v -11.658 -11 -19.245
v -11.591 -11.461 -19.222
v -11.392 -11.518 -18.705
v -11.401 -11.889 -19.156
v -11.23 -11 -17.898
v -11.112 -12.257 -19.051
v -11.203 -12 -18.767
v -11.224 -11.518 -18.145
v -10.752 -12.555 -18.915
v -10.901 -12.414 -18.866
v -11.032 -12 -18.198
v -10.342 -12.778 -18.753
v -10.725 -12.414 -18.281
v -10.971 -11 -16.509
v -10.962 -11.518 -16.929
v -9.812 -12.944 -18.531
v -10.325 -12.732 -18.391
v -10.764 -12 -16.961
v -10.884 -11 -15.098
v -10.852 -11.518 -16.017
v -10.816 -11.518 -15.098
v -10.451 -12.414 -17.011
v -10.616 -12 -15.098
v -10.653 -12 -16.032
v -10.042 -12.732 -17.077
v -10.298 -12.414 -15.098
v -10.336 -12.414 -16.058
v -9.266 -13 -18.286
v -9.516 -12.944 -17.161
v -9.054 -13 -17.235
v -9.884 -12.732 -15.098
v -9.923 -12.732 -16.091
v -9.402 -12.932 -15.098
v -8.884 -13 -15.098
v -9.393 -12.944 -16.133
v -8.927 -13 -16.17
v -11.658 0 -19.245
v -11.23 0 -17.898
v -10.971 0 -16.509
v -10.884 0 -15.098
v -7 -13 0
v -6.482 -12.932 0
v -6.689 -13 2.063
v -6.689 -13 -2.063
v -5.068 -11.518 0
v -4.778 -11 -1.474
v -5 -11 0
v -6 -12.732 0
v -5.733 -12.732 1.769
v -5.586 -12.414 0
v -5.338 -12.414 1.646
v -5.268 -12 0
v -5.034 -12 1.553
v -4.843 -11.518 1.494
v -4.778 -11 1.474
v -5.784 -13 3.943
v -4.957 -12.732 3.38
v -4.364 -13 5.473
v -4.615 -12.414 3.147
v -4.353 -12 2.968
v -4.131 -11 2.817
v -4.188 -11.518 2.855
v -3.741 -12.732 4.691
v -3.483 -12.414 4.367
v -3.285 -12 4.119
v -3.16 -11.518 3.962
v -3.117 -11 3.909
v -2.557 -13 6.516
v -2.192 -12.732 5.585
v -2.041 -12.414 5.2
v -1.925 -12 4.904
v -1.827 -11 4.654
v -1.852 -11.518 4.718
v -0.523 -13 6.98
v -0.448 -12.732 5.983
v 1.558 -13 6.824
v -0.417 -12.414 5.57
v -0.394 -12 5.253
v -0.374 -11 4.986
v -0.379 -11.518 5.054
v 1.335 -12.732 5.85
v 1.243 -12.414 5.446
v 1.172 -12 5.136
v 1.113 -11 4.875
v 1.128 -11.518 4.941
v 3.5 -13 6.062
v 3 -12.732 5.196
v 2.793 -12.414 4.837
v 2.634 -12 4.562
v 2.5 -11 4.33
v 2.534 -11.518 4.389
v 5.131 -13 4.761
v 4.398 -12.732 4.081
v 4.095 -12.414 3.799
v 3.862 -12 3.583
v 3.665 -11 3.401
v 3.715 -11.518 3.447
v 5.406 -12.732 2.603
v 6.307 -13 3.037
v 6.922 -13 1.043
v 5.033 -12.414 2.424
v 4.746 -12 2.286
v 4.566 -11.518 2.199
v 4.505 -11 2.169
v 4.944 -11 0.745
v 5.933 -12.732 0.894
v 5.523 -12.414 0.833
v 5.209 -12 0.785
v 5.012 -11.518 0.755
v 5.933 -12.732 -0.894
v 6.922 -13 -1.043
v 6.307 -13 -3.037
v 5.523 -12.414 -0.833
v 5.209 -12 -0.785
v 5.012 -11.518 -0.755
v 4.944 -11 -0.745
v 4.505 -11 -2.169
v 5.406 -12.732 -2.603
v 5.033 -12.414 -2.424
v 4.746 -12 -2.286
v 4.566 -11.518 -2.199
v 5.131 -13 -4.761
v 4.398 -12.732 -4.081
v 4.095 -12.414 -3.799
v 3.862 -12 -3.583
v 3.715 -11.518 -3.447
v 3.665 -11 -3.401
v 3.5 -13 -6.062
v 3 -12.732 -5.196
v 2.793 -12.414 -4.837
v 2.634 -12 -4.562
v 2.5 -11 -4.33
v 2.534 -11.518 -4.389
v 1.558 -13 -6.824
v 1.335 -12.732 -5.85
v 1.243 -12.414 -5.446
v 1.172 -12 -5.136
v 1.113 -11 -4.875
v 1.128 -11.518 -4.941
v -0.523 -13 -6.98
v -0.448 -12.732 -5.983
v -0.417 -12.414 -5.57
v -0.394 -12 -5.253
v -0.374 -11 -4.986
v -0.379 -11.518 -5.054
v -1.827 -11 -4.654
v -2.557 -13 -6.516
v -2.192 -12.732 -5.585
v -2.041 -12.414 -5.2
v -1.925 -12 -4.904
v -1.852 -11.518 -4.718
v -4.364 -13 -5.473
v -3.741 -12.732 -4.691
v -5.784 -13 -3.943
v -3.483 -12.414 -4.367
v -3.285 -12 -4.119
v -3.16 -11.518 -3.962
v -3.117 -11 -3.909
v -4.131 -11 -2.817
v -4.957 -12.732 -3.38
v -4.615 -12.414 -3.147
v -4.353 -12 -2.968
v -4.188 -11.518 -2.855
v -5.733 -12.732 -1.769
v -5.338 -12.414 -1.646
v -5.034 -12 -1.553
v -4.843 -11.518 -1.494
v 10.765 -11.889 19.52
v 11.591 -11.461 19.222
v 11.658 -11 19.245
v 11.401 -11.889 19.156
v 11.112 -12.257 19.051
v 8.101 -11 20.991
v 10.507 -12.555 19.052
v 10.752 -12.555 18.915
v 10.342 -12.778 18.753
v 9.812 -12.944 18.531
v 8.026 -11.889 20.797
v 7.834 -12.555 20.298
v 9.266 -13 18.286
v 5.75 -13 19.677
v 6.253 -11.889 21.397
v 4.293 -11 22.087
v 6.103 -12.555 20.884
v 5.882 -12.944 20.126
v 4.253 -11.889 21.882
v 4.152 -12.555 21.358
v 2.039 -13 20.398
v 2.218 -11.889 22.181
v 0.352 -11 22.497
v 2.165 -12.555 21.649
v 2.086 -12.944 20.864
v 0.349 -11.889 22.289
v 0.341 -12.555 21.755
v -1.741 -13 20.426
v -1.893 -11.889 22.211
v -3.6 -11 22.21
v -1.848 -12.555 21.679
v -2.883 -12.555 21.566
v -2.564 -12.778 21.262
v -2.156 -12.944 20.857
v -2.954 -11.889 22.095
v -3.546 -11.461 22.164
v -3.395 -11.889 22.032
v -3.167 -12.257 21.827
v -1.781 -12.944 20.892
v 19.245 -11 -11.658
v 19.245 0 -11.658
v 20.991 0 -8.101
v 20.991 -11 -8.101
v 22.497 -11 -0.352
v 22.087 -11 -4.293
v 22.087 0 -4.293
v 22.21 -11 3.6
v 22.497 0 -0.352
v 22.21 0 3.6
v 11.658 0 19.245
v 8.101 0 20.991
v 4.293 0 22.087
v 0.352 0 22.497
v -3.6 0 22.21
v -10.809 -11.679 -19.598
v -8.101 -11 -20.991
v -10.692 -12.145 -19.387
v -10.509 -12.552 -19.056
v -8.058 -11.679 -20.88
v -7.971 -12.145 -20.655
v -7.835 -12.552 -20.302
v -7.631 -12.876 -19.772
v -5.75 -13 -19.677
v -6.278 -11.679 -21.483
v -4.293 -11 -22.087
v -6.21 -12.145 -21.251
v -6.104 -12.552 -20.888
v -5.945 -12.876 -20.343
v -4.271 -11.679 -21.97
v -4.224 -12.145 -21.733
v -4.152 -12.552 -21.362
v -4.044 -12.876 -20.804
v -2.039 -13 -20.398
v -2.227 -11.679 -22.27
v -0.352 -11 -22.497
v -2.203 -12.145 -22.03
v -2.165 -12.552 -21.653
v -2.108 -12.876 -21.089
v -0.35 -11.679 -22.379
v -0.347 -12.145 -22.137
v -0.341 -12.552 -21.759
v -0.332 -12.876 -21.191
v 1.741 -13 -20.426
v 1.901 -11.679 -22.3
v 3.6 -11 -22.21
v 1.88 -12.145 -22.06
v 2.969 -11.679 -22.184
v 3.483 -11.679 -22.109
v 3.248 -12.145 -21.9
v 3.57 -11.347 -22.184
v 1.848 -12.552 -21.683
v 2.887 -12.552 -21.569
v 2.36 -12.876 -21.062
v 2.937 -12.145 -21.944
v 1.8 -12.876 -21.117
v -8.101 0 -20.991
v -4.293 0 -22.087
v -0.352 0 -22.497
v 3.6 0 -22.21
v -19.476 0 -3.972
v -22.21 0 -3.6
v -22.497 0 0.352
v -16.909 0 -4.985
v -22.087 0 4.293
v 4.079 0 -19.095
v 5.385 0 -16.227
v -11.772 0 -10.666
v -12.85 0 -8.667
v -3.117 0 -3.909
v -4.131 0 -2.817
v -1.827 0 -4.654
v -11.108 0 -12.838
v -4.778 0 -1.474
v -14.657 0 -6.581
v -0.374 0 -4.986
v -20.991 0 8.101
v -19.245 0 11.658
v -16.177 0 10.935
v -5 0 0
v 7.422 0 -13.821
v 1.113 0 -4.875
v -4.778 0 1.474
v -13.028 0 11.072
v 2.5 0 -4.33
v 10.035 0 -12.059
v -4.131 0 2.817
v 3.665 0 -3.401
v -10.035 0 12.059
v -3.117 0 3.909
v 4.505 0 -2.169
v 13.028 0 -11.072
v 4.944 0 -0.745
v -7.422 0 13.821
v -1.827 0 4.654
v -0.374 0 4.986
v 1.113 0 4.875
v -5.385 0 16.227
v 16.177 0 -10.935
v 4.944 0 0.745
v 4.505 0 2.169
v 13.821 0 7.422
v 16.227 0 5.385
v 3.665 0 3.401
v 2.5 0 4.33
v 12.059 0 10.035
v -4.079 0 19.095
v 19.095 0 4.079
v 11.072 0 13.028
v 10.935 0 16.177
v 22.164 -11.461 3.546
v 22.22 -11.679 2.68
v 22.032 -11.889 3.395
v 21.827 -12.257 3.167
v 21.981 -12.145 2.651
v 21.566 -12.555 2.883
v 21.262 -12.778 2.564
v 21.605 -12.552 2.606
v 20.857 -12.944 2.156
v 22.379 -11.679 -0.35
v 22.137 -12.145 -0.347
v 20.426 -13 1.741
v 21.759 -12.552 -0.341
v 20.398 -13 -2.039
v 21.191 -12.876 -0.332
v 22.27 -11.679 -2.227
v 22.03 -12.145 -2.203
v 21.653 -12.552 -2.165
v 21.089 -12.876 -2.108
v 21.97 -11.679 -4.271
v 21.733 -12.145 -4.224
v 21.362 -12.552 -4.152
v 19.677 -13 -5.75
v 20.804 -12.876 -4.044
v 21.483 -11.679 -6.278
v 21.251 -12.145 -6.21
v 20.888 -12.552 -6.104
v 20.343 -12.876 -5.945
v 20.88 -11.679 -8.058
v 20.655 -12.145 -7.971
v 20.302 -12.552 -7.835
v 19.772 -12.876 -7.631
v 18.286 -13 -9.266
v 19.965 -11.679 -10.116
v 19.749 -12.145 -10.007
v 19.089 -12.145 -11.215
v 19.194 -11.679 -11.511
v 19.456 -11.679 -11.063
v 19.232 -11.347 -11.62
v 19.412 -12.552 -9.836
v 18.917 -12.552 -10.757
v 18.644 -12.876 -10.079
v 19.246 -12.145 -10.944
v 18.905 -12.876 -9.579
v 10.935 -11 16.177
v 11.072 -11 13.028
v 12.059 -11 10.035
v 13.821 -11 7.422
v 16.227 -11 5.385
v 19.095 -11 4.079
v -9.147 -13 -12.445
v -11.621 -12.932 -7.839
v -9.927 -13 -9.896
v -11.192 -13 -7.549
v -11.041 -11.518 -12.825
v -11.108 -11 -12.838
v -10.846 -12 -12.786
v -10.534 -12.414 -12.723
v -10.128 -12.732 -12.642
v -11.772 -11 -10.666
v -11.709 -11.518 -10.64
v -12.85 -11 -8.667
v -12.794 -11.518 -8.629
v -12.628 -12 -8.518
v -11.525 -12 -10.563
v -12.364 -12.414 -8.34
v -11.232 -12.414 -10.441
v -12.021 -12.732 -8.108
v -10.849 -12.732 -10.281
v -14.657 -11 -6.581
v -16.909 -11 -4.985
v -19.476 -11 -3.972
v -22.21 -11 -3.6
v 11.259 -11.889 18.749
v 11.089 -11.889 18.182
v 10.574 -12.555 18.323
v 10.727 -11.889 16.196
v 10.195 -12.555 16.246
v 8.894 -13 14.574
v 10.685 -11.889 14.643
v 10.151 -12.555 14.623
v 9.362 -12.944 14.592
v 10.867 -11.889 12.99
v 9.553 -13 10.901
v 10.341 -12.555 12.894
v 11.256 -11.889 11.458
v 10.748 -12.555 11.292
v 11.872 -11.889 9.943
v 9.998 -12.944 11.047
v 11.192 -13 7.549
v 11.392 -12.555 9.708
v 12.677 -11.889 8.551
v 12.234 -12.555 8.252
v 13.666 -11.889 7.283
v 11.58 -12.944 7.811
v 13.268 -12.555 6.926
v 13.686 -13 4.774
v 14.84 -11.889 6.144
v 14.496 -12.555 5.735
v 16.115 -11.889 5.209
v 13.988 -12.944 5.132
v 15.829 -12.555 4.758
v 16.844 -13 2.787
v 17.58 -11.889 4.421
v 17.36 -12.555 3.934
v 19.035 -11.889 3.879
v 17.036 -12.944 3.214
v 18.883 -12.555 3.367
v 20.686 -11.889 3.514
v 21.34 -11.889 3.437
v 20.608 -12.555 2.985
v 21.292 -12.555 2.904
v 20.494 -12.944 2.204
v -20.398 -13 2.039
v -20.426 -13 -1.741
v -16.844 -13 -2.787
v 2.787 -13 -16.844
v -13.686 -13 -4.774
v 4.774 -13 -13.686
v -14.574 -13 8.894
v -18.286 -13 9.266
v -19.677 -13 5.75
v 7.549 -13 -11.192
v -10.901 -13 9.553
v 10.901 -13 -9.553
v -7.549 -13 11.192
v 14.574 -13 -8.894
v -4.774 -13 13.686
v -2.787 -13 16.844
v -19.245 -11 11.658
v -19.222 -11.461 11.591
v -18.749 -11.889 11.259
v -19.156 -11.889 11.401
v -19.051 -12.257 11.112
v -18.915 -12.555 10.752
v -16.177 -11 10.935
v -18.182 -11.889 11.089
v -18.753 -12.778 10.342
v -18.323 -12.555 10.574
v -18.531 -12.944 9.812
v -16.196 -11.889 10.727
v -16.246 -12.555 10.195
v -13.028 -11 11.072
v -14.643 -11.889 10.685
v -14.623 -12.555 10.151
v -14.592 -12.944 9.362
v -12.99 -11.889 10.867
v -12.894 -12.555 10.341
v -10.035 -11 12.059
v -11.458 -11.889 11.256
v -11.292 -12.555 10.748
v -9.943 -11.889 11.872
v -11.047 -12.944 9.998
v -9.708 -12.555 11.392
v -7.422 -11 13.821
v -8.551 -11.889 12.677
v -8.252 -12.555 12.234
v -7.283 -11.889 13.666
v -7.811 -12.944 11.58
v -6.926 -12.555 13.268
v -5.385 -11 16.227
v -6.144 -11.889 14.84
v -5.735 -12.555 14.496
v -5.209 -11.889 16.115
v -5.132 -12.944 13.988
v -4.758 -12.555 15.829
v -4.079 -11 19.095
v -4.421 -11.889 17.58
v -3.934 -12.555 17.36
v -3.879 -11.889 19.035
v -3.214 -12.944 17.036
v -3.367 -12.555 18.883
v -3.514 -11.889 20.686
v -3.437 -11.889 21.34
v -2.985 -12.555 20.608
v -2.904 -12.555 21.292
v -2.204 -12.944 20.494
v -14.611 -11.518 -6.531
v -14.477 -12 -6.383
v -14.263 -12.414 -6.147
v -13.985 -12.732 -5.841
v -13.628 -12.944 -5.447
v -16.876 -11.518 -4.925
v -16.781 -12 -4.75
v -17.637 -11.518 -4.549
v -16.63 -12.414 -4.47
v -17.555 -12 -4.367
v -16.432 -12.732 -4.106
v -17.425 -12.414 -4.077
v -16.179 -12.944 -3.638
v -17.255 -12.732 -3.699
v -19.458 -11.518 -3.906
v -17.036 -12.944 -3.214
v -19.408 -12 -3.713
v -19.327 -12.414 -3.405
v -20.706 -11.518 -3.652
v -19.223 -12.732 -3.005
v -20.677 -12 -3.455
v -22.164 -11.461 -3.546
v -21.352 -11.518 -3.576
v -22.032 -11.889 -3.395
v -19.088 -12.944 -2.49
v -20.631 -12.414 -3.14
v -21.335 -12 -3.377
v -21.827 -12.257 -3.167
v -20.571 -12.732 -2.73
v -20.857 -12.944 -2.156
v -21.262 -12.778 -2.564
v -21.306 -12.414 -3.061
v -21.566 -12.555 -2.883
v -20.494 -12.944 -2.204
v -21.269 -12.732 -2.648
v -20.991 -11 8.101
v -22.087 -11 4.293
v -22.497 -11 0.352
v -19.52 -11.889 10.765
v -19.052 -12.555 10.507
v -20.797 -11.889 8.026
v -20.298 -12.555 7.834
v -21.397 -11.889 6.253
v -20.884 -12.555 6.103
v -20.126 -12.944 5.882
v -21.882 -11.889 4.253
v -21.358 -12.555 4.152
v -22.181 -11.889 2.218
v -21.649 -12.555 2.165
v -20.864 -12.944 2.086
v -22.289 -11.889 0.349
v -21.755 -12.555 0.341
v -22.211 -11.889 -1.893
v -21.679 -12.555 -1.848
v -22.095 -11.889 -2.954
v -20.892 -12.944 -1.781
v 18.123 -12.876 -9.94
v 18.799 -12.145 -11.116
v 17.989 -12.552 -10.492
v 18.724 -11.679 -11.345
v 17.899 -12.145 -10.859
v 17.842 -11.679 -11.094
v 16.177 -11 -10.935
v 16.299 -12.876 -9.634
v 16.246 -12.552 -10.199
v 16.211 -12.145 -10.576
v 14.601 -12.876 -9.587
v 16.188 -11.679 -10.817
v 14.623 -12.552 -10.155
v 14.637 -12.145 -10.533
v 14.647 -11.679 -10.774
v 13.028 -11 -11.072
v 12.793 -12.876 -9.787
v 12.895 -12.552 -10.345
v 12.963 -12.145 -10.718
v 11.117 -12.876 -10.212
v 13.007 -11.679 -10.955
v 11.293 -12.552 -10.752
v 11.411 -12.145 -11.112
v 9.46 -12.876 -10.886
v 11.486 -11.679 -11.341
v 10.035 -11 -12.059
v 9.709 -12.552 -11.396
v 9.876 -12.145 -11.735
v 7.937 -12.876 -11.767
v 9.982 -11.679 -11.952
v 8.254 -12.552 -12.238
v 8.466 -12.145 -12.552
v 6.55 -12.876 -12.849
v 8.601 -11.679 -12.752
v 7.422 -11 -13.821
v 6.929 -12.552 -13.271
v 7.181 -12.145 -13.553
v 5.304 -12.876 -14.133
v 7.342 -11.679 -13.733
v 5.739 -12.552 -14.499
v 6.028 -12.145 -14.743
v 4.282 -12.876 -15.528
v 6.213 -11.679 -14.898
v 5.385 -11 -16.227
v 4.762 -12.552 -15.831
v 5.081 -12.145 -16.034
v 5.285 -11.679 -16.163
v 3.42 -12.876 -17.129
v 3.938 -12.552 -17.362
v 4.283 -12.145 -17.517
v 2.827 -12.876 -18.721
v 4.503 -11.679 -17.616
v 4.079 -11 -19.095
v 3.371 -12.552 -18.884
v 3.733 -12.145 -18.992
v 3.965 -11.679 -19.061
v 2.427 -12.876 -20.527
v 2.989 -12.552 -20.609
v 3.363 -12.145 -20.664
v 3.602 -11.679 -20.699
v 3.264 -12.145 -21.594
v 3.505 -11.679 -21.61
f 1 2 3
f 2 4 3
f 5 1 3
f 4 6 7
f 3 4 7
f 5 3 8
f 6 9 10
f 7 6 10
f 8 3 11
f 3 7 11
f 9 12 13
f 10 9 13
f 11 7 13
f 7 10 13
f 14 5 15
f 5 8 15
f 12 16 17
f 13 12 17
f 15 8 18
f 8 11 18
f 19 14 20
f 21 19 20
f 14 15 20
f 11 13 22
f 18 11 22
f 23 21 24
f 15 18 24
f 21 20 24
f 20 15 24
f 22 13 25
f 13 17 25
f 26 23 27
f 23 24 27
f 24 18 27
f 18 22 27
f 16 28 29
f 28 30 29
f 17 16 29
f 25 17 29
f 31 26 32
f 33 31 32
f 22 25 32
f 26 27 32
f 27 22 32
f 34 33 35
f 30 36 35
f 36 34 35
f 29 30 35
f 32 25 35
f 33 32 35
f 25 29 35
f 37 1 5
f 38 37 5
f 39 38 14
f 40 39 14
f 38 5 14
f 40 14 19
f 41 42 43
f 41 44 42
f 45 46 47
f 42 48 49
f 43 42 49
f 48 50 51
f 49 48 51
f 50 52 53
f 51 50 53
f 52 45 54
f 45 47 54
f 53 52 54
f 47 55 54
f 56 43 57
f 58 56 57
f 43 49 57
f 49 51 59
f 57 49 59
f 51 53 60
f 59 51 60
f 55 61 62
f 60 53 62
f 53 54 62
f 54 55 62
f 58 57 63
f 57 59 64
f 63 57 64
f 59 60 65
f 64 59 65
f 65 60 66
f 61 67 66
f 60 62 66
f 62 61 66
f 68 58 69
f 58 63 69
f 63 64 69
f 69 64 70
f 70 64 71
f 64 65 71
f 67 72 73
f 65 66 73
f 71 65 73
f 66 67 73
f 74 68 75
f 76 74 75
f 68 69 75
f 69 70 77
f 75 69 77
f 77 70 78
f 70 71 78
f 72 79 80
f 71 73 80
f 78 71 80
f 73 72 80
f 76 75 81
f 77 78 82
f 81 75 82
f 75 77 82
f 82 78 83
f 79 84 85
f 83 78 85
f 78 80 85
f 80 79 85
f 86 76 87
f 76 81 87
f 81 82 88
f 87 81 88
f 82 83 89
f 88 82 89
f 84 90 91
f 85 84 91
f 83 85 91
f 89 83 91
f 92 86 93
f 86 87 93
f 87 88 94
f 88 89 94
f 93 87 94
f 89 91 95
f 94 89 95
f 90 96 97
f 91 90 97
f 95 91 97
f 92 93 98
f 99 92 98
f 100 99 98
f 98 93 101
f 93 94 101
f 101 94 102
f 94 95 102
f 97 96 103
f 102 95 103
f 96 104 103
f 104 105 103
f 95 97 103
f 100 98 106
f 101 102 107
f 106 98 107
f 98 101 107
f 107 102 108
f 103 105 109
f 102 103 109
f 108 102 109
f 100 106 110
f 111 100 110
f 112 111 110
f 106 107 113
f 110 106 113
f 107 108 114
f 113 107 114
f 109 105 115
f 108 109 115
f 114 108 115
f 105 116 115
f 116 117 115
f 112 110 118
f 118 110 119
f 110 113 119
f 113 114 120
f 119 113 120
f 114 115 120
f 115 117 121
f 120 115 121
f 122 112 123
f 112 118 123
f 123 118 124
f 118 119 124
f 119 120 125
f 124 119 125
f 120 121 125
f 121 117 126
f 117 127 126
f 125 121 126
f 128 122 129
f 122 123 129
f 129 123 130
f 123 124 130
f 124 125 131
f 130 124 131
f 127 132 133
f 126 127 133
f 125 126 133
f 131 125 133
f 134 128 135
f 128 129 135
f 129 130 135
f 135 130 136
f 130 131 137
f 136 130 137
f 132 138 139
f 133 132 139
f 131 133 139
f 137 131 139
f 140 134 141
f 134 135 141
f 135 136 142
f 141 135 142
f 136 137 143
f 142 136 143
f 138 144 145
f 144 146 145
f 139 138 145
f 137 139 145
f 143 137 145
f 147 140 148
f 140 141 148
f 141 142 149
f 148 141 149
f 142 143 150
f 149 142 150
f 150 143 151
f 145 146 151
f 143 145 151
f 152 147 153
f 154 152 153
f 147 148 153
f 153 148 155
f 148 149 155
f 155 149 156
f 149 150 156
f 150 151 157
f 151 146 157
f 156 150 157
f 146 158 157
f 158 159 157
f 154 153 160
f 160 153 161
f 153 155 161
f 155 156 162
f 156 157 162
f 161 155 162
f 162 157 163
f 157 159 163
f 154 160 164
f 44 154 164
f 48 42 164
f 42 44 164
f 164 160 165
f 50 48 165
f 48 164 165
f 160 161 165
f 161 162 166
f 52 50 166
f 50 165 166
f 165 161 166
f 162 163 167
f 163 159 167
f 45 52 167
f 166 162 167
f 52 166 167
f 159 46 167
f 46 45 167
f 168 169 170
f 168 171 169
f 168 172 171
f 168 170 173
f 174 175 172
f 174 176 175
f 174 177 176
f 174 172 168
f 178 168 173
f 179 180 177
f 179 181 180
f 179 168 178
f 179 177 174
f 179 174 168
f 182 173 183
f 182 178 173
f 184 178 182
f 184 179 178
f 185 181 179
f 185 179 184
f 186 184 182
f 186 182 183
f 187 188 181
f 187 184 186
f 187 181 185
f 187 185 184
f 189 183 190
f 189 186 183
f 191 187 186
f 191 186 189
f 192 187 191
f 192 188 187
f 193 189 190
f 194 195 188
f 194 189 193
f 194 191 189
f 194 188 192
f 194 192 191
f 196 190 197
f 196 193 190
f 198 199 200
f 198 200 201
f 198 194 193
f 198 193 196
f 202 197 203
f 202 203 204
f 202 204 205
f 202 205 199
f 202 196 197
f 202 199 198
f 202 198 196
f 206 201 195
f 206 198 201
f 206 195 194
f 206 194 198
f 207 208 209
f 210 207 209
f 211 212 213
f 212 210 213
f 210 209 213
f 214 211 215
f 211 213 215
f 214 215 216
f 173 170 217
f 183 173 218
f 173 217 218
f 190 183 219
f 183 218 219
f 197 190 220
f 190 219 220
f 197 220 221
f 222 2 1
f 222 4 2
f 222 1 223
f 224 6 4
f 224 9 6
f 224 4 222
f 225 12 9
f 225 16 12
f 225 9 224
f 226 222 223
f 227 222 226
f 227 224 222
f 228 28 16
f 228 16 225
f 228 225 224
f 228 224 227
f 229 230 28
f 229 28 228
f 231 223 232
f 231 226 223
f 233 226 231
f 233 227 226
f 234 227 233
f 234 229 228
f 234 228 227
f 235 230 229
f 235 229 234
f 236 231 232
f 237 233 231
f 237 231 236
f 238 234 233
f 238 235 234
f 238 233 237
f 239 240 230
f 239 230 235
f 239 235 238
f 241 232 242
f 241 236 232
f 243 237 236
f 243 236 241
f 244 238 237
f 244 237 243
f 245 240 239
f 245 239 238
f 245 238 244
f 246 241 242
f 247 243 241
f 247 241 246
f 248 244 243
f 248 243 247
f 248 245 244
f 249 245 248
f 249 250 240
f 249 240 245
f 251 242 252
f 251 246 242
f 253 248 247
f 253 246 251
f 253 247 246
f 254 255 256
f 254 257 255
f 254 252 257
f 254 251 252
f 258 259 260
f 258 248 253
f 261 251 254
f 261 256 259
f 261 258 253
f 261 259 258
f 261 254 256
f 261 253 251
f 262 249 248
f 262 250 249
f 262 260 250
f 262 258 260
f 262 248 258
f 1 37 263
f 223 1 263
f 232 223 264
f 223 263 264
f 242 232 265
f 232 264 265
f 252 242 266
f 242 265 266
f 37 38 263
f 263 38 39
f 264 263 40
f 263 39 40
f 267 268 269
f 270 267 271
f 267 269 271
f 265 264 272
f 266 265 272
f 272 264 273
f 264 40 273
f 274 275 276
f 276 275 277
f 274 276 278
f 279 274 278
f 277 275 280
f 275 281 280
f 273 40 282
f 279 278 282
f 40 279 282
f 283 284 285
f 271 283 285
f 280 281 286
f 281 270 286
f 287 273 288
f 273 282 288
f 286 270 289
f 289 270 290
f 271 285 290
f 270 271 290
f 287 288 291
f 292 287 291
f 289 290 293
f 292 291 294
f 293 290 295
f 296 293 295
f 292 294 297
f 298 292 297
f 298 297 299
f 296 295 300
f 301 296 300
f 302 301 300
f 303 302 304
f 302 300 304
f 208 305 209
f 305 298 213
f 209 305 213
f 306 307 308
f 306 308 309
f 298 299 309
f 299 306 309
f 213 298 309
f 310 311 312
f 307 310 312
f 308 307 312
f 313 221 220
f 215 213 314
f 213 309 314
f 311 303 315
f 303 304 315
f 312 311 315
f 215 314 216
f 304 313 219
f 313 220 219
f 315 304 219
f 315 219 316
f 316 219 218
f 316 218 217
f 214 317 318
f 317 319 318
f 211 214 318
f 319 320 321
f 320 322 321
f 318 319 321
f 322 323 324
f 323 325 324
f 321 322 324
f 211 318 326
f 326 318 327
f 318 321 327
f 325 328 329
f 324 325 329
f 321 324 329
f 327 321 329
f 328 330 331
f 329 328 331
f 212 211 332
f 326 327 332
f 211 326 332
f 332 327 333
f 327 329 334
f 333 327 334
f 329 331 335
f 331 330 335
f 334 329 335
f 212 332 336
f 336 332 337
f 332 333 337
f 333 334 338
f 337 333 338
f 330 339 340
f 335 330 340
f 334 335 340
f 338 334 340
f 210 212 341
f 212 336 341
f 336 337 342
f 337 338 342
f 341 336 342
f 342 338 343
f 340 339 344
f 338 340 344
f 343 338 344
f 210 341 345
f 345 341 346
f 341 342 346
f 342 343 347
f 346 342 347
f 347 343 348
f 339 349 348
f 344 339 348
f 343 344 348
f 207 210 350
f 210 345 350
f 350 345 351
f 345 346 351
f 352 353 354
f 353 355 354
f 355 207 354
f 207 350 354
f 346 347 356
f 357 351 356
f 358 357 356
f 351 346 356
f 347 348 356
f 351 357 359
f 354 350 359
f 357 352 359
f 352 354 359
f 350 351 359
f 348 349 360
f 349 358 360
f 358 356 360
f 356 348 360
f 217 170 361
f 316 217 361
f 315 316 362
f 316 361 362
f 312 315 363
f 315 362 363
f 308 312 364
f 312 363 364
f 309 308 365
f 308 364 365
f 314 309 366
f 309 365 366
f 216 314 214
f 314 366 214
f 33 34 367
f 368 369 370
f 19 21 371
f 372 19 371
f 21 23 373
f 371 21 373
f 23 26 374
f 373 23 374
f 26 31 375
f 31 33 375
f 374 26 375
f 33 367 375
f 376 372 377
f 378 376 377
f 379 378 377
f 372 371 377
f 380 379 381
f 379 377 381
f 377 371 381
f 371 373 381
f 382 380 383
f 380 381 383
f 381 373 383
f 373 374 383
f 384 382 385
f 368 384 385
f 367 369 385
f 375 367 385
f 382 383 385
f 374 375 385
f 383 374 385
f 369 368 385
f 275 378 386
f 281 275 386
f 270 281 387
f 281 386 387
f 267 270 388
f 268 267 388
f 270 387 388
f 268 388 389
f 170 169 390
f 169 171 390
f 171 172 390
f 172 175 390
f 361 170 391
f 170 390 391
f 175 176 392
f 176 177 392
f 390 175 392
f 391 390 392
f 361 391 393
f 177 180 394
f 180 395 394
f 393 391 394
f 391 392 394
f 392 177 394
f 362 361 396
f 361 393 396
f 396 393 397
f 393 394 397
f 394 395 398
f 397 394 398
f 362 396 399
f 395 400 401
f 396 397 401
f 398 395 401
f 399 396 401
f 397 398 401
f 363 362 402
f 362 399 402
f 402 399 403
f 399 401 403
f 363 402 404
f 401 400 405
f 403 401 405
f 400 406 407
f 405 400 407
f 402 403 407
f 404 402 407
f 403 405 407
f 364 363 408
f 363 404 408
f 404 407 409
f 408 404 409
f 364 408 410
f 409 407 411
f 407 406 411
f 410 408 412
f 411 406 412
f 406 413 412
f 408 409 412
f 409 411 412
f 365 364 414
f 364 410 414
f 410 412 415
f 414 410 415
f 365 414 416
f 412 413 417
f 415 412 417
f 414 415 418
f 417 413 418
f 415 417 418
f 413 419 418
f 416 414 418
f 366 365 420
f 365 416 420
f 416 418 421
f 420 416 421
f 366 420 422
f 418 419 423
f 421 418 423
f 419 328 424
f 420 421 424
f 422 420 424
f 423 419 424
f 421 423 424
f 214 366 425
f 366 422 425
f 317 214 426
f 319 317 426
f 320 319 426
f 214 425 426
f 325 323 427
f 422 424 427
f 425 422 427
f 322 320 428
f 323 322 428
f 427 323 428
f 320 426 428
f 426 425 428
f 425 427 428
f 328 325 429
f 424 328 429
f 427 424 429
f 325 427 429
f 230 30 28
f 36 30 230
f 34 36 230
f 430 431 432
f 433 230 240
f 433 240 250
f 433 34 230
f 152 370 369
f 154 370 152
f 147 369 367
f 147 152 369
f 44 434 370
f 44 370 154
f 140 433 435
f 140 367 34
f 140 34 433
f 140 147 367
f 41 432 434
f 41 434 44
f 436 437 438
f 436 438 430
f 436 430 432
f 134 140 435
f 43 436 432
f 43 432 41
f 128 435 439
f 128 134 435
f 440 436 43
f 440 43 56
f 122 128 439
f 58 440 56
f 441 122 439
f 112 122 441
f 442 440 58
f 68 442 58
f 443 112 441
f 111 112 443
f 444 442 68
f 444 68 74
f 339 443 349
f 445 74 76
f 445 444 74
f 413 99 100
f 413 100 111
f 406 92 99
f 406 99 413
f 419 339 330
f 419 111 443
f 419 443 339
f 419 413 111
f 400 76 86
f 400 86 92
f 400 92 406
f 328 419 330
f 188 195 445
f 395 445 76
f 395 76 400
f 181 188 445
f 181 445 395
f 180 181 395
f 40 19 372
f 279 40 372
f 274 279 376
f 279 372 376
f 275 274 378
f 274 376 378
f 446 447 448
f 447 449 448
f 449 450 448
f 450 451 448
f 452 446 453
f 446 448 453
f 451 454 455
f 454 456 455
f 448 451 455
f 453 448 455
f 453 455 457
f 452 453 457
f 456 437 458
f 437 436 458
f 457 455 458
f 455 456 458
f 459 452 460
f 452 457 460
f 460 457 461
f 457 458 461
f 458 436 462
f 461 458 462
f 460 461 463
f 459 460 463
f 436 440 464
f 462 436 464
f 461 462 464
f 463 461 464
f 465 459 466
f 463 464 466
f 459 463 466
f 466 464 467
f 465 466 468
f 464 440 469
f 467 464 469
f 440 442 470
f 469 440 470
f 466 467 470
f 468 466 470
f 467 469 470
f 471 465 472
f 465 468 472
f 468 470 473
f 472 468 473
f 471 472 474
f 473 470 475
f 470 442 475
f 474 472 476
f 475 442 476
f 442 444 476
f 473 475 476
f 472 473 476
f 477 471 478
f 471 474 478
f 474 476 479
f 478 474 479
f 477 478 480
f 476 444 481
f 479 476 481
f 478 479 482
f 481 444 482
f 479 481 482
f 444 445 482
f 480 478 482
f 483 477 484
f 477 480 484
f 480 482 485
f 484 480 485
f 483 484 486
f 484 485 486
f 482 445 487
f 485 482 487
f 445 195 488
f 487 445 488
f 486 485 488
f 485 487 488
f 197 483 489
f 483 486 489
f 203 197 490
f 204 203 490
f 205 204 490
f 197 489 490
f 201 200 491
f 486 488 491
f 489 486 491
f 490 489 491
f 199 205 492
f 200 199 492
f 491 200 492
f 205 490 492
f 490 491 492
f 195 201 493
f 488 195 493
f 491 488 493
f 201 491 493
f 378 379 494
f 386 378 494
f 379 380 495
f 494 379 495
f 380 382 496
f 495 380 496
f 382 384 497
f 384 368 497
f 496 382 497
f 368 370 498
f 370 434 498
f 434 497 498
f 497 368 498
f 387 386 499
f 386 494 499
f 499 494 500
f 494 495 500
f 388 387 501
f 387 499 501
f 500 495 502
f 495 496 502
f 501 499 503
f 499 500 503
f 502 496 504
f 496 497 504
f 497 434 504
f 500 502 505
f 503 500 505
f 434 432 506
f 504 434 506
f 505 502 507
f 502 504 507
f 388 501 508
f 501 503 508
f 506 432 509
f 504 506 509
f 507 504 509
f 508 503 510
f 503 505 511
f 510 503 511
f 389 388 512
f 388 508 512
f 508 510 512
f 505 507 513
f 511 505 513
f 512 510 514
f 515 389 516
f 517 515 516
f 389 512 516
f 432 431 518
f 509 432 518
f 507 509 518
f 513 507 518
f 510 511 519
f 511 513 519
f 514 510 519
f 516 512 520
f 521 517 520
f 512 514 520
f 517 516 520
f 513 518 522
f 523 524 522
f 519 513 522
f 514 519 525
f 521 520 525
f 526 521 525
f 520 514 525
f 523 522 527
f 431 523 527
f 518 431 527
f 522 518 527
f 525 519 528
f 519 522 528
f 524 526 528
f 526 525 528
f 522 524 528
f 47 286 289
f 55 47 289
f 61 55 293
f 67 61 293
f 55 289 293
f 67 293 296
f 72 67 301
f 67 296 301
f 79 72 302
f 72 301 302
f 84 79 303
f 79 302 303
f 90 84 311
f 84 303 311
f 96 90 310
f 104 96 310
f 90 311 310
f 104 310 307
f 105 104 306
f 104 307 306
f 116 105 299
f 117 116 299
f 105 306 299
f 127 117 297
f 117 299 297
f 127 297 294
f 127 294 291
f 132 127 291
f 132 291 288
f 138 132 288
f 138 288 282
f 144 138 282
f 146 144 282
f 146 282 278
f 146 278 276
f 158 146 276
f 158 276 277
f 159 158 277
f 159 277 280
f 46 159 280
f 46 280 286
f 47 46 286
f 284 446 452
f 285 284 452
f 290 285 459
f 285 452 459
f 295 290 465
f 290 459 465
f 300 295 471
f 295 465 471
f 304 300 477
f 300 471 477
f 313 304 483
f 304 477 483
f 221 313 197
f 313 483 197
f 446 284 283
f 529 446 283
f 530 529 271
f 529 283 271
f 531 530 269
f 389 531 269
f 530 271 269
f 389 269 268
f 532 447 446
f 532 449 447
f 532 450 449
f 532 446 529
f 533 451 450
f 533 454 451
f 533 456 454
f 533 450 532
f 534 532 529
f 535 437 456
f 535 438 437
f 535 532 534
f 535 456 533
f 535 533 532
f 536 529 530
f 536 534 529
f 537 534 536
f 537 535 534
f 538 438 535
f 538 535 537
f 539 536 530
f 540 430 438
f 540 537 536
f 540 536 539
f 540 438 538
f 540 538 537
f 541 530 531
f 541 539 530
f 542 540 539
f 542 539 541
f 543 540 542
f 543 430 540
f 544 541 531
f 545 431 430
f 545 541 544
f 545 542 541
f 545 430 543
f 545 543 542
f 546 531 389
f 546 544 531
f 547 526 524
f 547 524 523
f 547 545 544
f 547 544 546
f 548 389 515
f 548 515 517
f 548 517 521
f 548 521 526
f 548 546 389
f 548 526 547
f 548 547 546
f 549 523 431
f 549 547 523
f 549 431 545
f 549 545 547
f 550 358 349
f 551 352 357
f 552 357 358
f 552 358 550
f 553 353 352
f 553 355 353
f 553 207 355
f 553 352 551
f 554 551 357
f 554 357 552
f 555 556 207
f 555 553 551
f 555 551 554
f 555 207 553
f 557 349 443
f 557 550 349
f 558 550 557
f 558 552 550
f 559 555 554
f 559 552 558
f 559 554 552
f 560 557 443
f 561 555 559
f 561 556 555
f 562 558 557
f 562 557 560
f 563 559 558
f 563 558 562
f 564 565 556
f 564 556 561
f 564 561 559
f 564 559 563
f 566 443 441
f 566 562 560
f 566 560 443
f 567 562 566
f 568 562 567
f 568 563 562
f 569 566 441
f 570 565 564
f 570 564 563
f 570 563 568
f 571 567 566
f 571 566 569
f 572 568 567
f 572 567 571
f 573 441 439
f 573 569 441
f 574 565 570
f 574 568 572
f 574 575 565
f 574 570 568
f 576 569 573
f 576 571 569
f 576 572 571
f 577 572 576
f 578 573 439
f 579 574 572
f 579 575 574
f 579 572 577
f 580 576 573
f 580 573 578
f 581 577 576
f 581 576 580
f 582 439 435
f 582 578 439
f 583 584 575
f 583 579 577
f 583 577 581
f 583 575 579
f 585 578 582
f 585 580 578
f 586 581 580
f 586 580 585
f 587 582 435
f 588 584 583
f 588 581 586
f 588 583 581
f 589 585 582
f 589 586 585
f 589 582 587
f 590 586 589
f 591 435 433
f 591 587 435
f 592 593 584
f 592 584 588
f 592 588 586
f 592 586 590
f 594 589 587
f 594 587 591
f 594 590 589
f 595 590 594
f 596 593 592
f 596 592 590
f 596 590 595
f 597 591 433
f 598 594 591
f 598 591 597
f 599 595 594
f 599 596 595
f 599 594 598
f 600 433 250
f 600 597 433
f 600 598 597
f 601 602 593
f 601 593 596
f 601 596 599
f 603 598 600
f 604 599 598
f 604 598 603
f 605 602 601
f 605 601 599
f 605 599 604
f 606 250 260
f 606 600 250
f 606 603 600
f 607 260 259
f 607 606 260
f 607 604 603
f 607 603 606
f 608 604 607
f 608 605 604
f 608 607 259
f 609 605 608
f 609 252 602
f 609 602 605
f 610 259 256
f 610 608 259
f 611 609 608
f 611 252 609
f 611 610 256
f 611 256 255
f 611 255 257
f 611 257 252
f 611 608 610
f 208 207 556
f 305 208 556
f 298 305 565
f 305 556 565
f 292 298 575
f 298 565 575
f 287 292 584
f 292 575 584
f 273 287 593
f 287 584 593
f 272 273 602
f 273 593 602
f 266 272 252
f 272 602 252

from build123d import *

# Parameters (mm, degrees)
F0_R     = 22.5
F1_DEPTH = 13
F3_D     = 10
F5_DEPTH = 25
F6_R     = 2


with BuildPart() as f1:
    # F0 (on Front) → F1 (new body)
    with BuildSketch(Plane.XZ):
        Circle(F0_R)
    extrude(amount=F1_DEPTH)

    # F3 (through all)
    with Locations(Plane.XZ.offset(13)):
        with Locations((0, 0)):
            Hole(F3_D / 2)

    # F4 (on face) → F5 (cut)
    with BuildSketch(Plane.XZ.offset(13)):
        with BuildLine():
            Line((-18.6533453825, -12.5818403281), (-12.8500823746, -8.6674900038))
            ThreePointArc((-12.8500823746, -8.6674900038), (-16.9085134828, -4.9854002249), (-22.2102103191, -3.5995218548))
            ThreePointArc((-22.2102103191, -3.5995218548), (-20.9195615975, -8.2838362229), (-18.6533453825, -12.5818403281))
        make_face()
        with BuildLine():
            ThreePointArc((-11.6575097746, -19.2445437944), (-11.0790420161, -17.2071413146), (-10.884014459, -15.0982083937))
            ThreePointArc((-10.884014459, -15.0982083937), (-11.3865097654, -11.7359337894), (-12.8500823746, -8.6674900038))
            Line((-12.8500823746, -8.6674900038), (-18.6533453825, -12.5818403281))
            ThreePointArc((-18.6533453825, -12.5818403281), (-15.5172449055, -16.29310009), (-11.6575097746, -19.2445437944))
        make_face()
        with BuildLine():
            ThreePointArc((19.2445437944, -11.6575097746), (8.6674900038, -12.8500823746), (3.5995218548, -22.2102103191))
            ThreePointArc((3.5995218548, -22.2102103191), (12.5818403281, -18.6533453825), (19.2445437944, -11.6575097746))
        make_face()
        with BuildLine():
            ThreePointArc((22.2102103191, 3.5995218548), (18.6533453825, 12.5818403281), (11.6575097746, 19.2445437944))
            ThreePointArc((11.6575097746, 19.2445437944), (12.8500823746, 8.6674900038), (22.2102103191, 3.5995218548))
        make_face()
        with BuildLine():
            ThreePointArc((-3.5995218548, 22.2102103191), (-12.5818403281, 18.6533453825), (-19.2445437944, 11.6575097746))
            ThreePointArc((-19.2445437944, 11.6575097746), (-8.6674900038, 12.8500823746), (-3.5995218548, 22.2102103191))
        make_face()
    extrude(amount=-F5_DEPTH, mode=Mode.SUBTRACT)

    # F6
    f6_edges = [f1.edges().sort_by_distance(p)[0] for p in [
        (8.66749, -13, -12.850082),
        (22.086612, -13, -4.293202),
        (12.850082, -13, 8.66749),
        (4.293202, -13, 22.086612),
        (-8.66749, -13, 12.850082),
        (-22.086612, -13, 4.293202),
        (-12.850082, -13, -8.66749),
        (-4.293202, -13, -22.086612),
        (-5, -13, 0),
    ]]
    fillet(f6_edges, radius=F6_R)


solid = f1.part
